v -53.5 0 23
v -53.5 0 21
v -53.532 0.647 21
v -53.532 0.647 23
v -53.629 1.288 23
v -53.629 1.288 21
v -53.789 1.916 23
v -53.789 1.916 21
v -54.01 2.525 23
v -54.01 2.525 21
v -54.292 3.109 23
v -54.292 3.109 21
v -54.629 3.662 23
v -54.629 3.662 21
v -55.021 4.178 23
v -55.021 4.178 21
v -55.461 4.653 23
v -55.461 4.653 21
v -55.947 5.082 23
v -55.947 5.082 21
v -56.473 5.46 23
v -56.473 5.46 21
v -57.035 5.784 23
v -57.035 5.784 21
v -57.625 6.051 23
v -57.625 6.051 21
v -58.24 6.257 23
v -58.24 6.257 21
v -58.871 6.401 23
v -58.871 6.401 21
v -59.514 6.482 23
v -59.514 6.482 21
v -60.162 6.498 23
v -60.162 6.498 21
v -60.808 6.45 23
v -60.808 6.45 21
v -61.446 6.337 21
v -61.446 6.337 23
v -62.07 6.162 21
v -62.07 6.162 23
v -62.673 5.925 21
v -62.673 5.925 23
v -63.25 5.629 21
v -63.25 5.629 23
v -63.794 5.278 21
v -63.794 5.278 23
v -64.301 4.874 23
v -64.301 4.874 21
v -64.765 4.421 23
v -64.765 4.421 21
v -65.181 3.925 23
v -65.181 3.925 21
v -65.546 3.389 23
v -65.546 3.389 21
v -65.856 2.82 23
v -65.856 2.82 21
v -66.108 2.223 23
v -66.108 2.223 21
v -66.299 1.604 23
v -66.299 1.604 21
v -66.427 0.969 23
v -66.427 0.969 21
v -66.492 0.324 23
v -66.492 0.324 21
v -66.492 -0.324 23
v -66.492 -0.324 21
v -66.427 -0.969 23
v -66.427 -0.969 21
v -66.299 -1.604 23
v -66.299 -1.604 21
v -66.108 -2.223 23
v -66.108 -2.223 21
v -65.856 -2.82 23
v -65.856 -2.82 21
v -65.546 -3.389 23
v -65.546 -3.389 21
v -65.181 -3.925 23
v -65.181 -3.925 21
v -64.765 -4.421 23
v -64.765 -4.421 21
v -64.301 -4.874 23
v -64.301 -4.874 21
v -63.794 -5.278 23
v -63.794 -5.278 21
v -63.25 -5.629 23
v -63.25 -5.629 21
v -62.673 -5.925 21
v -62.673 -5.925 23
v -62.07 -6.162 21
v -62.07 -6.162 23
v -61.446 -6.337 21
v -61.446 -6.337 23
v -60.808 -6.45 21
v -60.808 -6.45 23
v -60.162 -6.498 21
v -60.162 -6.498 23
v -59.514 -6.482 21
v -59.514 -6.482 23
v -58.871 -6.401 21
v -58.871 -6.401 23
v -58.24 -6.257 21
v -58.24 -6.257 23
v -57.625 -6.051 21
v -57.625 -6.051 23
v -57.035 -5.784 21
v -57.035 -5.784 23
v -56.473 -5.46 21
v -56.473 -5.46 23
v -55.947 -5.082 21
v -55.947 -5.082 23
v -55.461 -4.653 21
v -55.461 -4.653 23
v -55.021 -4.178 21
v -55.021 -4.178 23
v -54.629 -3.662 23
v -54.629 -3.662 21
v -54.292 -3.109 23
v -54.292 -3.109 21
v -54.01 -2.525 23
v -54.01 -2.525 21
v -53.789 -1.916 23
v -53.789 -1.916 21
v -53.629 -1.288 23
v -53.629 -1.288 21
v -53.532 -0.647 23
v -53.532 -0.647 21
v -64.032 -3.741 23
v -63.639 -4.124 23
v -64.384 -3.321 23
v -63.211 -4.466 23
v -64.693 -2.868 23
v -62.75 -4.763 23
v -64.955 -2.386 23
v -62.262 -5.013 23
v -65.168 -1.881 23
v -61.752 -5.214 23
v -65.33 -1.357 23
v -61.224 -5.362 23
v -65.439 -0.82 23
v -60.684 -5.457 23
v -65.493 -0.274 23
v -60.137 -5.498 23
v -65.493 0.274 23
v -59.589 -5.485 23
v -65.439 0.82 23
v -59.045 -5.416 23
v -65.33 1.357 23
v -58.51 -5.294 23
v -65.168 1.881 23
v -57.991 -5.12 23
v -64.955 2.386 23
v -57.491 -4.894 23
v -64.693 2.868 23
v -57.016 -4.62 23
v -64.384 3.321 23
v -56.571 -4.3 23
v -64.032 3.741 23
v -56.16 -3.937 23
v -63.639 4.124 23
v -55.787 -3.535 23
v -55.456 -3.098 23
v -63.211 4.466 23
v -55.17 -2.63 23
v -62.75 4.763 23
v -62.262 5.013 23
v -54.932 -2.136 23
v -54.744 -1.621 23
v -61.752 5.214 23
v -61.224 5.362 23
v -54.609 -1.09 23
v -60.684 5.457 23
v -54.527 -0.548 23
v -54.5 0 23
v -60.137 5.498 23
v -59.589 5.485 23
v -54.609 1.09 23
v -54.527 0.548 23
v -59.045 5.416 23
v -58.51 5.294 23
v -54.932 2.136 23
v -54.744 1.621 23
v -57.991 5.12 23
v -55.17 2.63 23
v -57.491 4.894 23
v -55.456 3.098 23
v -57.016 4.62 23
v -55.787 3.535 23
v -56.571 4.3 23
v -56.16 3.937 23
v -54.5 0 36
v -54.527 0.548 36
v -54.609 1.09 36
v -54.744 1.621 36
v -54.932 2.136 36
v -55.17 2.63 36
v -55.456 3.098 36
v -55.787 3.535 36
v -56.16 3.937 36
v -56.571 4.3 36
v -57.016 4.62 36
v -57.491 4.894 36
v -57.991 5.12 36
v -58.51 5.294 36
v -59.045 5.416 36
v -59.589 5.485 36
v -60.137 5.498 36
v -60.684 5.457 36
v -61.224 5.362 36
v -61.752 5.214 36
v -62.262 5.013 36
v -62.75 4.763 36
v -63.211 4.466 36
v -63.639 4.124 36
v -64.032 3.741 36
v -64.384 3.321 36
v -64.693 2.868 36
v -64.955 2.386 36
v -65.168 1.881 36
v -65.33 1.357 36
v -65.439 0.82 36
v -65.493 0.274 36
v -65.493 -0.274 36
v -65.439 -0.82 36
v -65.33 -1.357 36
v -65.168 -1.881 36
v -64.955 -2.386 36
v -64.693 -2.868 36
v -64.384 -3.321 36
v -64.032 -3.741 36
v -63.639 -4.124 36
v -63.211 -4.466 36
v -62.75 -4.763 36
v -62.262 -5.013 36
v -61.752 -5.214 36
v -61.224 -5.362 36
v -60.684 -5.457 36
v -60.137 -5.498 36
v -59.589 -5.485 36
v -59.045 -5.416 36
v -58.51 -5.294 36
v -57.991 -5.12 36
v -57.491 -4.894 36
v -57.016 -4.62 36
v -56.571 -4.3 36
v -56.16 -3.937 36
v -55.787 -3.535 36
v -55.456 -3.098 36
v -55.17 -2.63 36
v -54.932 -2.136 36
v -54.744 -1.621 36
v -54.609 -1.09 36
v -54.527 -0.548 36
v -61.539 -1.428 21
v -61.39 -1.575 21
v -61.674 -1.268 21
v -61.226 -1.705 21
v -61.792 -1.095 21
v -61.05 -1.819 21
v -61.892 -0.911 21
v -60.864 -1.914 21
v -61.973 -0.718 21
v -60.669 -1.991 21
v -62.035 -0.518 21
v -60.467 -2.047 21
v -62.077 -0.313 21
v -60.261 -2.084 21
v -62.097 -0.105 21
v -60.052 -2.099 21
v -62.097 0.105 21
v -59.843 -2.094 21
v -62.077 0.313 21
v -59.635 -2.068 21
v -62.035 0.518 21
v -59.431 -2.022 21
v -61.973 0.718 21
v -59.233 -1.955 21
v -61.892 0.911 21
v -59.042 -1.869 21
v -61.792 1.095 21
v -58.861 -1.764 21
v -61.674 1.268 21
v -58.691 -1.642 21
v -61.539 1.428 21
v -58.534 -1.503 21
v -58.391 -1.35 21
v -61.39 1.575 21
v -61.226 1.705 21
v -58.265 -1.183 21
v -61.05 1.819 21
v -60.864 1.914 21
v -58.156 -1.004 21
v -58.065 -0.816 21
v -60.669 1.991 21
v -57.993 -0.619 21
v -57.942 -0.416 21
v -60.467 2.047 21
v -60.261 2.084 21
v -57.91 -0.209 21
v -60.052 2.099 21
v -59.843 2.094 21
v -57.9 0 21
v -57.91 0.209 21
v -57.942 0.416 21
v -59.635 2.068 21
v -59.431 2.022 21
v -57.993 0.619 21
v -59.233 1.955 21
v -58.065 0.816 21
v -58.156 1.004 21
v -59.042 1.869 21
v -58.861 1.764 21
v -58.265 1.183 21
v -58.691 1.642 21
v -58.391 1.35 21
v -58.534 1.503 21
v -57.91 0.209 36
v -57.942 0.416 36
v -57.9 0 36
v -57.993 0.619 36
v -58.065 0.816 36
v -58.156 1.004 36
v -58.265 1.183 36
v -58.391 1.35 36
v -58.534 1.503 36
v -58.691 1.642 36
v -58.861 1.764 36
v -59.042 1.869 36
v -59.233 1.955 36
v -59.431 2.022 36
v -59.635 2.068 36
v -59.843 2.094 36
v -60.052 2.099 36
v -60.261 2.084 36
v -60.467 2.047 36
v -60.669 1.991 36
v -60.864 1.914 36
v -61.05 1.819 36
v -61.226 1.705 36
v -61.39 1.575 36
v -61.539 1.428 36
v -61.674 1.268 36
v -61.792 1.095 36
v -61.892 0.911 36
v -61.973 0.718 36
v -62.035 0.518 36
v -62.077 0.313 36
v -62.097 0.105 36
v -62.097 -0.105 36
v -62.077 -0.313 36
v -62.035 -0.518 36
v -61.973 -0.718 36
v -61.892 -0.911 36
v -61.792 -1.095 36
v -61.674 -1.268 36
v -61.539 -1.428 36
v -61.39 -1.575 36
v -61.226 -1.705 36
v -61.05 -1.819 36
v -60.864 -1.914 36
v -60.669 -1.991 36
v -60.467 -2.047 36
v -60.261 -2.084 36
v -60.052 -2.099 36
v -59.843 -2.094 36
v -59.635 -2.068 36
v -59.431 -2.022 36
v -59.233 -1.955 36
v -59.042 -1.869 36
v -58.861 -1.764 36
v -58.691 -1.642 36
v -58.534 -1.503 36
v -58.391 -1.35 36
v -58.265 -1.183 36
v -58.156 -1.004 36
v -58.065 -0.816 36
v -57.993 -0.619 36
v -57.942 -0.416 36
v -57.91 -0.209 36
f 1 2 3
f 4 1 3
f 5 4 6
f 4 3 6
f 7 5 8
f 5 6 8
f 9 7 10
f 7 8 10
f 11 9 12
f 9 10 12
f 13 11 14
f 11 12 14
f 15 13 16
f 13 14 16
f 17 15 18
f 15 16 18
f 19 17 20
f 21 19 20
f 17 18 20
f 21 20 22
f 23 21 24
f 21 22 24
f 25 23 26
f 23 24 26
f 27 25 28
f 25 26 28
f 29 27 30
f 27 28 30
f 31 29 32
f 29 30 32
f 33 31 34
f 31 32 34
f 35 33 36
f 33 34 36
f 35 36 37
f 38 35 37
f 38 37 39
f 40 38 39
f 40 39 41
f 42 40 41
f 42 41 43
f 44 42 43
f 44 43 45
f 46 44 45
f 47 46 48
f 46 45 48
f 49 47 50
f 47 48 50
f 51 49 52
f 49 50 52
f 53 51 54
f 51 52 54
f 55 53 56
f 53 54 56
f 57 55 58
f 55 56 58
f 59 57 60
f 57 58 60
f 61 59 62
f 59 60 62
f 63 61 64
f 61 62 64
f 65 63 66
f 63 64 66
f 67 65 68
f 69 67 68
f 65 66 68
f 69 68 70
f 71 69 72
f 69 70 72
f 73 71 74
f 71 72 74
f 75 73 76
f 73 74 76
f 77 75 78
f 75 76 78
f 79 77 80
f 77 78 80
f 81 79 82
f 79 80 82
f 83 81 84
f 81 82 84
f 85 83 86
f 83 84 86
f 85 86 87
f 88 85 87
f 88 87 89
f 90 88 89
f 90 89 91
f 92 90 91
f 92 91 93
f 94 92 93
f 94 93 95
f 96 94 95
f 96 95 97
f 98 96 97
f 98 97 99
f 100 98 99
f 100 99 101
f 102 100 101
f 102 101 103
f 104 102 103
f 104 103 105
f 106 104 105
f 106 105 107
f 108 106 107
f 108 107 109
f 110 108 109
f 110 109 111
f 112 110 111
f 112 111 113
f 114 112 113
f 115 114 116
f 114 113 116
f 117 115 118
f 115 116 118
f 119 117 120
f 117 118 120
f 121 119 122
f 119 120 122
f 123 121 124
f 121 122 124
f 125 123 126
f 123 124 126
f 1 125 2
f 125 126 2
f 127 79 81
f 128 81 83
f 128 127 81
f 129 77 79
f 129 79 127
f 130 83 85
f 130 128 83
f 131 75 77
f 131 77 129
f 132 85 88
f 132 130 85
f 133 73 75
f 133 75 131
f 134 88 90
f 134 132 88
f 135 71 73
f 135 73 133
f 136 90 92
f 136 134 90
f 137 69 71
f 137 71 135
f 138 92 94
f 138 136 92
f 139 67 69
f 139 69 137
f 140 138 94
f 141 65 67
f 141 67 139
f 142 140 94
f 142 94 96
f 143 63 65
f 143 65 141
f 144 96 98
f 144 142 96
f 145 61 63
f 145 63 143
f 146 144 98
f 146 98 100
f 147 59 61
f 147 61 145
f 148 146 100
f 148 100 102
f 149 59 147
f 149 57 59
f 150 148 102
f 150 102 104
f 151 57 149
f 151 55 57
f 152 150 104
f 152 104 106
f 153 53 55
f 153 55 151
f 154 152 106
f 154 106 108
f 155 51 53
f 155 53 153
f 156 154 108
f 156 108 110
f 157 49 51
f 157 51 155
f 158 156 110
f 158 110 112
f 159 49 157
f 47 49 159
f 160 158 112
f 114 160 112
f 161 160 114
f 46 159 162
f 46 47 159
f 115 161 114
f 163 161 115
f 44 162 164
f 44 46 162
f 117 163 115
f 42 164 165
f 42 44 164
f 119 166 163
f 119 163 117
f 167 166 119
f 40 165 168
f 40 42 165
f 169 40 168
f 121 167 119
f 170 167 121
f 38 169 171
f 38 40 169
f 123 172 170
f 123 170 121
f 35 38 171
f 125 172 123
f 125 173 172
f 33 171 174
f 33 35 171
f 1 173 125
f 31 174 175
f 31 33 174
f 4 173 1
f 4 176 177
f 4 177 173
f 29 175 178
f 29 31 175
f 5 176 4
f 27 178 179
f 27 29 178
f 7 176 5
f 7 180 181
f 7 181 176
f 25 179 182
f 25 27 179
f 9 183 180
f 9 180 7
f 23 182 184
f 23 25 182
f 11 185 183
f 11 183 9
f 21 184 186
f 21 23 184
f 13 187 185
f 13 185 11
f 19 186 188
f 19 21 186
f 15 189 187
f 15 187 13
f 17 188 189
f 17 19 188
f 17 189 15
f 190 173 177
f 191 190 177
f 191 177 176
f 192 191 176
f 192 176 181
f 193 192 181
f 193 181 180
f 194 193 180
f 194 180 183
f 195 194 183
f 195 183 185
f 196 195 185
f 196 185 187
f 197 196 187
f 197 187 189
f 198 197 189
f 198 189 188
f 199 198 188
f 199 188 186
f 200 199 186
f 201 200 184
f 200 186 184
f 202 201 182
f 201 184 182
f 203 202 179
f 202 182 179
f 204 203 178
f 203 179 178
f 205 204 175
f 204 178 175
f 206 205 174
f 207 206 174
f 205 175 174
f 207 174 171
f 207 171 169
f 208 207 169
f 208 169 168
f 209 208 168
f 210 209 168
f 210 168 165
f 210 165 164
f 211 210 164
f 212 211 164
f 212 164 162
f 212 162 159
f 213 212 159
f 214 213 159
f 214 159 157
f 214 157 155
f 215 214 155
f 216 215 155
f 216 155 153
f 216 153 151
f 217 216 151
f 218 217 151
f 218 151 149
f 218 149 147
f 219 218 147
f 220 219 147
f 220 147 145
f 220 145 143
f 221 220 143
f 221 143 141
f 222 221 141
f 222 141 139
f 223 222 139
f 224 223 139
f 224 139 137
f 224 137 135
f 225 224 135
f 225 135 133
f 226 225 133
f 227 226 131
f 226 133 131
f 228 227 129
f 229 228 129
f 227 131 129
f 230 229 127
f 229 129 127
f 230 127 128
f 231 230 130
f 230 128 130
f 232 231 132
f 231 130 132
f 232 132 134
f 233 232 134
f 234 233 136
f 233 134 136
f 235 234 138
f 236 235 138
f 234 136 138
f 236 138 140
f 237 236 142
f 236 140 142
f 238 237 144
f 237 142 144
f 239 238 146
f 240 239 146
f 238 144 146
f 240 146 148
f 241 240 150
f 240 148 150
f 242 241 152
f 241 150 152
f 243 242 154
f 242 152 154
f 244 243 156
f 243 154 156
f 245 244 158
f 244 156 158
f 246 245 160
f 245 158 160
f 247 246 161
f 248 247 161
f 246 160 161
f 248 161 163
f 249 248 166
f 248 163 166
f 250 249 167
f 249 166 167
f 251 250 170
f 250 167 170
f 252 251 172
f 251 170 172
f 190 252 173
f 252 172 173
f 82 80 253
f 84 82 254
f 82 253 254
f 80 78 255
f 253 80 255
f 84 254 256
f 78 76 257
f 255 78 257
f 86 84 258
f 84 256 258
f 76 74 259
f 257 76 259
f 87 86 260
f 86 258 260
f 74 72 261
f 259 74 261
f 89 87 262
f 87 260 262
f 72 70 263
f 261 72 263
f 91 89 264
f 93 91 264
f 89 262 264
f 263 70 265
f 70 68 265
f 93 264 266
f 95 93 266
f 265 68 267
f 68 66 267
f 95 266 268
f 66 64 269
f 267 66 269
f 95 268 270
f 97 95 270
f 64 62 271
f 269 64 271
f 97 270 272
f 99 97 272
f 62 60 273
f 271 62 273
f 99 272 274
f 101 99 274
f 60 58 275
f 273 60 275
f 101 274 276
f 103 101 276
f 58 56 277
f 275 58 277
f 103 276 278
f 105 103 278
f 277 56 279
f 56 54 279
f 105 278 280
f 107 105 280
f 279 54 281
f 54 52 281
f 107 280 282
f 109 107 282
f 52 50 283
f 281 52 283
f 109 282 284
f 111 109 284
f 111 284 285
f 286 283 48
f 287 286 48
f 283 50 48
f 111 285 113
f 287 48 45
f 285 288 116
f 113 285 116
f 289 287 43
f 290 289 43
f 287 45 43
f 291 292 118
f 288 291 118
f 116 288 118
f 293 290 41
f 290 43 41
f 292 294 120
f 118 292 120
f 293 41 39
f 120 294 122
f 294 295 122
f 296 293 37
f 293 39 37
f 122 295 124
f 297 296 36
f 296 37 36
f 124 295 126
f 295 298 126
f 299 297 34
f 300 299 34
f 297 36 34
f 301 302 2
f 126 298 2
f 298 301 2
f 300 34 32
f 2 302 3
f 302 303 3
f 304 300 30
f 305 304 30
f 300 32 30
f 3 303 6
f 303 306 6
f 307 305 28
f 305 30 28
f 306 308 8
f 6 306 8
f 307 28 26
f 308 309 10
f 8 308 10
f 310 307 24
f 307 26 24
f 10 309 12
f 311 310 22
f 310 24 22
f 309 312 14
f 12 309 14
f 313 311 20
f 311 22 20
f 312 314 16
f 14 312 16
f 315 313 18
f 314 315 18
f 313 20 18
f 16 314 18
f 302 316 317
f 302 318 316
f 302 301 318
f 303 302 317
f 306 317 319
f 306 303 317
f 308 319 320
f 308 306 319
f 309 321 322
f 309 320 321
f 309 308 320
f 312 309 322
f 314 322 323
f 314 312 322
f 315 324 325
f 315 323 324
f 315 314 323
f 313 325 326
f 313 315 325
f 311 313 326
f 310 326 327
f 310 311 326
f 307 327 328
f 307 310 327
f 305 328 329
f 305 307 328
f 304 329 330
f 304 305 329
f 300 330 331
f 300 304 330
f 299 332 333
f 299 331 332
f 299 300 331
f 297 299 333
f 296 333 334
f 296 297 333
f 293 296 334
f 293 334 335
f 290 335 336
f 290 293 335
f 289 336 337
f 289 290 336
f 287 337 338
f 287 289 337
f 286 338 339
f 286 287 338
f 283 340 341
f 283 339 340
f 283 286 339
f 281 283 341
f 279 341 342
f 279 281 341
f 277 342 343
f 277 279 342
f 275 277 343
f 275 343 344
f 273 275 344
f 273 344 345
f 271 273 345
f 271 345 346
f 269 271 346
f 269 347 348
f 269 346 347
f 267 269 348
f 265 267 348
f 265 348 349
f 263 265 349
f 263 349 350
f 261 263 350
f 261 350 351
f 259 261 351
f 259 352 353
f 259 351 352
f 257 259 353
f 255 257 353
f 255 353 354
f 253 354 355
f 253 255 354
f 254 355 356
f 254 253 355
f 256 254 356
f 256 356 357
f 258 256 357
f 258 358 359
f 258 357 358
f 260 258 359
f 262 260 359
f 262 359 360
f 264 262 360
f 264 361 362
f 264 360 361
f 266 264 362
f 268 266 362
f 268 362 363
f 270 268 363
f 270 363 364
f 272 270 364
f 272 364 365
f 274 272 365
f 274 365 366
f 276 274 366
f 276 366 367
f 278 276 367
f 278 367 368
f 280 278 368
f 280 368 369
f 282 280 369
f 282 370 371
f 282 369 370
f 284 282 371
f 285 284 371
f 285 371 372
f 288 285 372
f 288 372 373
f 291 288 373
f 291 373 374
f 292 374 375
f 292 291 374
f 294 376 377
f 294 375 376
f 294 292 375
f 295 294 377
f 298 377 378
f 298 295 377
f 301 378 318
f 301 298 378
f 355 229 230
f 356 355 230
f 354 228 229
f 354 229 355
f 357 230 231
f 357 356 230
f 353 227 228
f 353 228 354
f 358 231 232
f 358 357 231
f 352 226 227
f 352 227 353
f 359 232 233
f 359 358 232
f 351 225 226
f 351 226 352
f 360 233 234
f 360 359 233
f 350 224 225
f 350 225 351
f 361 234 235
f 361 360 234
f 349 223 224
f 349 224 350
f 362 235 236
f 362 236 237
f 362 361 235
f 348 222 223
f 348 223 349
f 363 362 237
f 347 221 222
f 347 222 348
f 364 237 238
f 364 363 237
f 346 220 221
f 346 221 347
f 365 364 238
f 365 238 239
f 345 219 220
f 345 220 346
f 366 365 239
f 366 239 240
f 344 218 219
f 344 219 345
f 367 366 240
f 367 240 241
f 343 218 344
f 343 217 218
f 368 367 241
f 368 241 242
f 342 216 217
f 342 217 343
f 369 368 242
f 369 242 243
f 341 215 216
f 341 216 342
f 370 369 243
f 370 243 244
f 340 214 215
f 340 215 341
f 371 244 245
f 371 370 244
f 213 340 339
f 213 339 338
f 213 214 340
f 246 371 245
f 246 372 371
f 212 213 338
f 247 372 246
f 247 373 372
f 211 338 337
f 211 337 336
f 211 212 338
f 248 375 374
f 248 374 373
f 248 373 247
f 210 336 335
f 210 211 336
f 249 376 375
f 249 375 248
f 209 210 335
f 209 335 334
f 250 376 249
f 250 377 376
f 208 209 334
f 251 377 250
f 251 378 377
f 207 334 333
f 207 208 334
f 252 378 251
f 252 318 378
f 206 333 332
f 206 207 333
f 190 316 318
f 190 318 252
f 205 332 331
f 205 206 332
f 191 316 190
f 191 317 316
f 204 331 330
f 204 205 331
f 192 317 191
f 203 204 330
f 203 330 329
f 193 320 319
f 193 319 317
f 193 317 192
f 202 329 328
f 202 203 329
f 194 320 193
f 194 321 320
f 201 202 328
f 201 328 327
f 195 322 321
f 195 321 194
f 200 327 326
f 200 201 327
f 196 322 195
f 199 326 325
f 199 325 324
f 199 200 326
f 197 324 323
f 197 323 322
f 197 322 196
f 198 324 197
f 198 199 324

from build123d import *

# Parameters (mm, degrees)
CYLINDER_R        = 2.1
CYLINDER_DEPTH    = 100
CYLINDER006_R     = 5.5
CYLINDER006_DEPTH = 15
CYLINDER007_R     = 6.5
CYLINDER007_DEPTH = 2


with BuildPart() as centeraxis:
    # Cylinder → Cylinder (new body)
    with BuildSketch(Plane.XY.offset(-10)):
        Circle(CYLINDER_R)
    extrude(amount=CYLINDER_DEPTH)


with BuildPart() as bearing003:
    # Cylinder006 → Cylinder006 (new body)
    with BuildSketch(Plane.XY.offset(21)):
        Circle(CYLINDER006_R)
    extrude(amount=CYLINDER006_DEPTH)


with BuildPart() as centerbearing001:
    # Cylinder007 → Cylinder007 (new body)
    with BuildSketch(Plane.XY.offset(21)):
        Circle(CYLINDER007_R)
    extrude(amount=CYLINDER007_DEPTH)

    # Fusion001: union Bearing003
    add(bearing003.part)

    # Cut012: cut CenterAxis
    add(centeraxis.part, mode=Mode.SUBTRACT)


with BuildPart() as centerbearing001_1:
    # Cut012 placement: moved
    add(centerbearing001.part.moved(Location((-60, 0, 0))))


solid = centerbearing001_1.part
